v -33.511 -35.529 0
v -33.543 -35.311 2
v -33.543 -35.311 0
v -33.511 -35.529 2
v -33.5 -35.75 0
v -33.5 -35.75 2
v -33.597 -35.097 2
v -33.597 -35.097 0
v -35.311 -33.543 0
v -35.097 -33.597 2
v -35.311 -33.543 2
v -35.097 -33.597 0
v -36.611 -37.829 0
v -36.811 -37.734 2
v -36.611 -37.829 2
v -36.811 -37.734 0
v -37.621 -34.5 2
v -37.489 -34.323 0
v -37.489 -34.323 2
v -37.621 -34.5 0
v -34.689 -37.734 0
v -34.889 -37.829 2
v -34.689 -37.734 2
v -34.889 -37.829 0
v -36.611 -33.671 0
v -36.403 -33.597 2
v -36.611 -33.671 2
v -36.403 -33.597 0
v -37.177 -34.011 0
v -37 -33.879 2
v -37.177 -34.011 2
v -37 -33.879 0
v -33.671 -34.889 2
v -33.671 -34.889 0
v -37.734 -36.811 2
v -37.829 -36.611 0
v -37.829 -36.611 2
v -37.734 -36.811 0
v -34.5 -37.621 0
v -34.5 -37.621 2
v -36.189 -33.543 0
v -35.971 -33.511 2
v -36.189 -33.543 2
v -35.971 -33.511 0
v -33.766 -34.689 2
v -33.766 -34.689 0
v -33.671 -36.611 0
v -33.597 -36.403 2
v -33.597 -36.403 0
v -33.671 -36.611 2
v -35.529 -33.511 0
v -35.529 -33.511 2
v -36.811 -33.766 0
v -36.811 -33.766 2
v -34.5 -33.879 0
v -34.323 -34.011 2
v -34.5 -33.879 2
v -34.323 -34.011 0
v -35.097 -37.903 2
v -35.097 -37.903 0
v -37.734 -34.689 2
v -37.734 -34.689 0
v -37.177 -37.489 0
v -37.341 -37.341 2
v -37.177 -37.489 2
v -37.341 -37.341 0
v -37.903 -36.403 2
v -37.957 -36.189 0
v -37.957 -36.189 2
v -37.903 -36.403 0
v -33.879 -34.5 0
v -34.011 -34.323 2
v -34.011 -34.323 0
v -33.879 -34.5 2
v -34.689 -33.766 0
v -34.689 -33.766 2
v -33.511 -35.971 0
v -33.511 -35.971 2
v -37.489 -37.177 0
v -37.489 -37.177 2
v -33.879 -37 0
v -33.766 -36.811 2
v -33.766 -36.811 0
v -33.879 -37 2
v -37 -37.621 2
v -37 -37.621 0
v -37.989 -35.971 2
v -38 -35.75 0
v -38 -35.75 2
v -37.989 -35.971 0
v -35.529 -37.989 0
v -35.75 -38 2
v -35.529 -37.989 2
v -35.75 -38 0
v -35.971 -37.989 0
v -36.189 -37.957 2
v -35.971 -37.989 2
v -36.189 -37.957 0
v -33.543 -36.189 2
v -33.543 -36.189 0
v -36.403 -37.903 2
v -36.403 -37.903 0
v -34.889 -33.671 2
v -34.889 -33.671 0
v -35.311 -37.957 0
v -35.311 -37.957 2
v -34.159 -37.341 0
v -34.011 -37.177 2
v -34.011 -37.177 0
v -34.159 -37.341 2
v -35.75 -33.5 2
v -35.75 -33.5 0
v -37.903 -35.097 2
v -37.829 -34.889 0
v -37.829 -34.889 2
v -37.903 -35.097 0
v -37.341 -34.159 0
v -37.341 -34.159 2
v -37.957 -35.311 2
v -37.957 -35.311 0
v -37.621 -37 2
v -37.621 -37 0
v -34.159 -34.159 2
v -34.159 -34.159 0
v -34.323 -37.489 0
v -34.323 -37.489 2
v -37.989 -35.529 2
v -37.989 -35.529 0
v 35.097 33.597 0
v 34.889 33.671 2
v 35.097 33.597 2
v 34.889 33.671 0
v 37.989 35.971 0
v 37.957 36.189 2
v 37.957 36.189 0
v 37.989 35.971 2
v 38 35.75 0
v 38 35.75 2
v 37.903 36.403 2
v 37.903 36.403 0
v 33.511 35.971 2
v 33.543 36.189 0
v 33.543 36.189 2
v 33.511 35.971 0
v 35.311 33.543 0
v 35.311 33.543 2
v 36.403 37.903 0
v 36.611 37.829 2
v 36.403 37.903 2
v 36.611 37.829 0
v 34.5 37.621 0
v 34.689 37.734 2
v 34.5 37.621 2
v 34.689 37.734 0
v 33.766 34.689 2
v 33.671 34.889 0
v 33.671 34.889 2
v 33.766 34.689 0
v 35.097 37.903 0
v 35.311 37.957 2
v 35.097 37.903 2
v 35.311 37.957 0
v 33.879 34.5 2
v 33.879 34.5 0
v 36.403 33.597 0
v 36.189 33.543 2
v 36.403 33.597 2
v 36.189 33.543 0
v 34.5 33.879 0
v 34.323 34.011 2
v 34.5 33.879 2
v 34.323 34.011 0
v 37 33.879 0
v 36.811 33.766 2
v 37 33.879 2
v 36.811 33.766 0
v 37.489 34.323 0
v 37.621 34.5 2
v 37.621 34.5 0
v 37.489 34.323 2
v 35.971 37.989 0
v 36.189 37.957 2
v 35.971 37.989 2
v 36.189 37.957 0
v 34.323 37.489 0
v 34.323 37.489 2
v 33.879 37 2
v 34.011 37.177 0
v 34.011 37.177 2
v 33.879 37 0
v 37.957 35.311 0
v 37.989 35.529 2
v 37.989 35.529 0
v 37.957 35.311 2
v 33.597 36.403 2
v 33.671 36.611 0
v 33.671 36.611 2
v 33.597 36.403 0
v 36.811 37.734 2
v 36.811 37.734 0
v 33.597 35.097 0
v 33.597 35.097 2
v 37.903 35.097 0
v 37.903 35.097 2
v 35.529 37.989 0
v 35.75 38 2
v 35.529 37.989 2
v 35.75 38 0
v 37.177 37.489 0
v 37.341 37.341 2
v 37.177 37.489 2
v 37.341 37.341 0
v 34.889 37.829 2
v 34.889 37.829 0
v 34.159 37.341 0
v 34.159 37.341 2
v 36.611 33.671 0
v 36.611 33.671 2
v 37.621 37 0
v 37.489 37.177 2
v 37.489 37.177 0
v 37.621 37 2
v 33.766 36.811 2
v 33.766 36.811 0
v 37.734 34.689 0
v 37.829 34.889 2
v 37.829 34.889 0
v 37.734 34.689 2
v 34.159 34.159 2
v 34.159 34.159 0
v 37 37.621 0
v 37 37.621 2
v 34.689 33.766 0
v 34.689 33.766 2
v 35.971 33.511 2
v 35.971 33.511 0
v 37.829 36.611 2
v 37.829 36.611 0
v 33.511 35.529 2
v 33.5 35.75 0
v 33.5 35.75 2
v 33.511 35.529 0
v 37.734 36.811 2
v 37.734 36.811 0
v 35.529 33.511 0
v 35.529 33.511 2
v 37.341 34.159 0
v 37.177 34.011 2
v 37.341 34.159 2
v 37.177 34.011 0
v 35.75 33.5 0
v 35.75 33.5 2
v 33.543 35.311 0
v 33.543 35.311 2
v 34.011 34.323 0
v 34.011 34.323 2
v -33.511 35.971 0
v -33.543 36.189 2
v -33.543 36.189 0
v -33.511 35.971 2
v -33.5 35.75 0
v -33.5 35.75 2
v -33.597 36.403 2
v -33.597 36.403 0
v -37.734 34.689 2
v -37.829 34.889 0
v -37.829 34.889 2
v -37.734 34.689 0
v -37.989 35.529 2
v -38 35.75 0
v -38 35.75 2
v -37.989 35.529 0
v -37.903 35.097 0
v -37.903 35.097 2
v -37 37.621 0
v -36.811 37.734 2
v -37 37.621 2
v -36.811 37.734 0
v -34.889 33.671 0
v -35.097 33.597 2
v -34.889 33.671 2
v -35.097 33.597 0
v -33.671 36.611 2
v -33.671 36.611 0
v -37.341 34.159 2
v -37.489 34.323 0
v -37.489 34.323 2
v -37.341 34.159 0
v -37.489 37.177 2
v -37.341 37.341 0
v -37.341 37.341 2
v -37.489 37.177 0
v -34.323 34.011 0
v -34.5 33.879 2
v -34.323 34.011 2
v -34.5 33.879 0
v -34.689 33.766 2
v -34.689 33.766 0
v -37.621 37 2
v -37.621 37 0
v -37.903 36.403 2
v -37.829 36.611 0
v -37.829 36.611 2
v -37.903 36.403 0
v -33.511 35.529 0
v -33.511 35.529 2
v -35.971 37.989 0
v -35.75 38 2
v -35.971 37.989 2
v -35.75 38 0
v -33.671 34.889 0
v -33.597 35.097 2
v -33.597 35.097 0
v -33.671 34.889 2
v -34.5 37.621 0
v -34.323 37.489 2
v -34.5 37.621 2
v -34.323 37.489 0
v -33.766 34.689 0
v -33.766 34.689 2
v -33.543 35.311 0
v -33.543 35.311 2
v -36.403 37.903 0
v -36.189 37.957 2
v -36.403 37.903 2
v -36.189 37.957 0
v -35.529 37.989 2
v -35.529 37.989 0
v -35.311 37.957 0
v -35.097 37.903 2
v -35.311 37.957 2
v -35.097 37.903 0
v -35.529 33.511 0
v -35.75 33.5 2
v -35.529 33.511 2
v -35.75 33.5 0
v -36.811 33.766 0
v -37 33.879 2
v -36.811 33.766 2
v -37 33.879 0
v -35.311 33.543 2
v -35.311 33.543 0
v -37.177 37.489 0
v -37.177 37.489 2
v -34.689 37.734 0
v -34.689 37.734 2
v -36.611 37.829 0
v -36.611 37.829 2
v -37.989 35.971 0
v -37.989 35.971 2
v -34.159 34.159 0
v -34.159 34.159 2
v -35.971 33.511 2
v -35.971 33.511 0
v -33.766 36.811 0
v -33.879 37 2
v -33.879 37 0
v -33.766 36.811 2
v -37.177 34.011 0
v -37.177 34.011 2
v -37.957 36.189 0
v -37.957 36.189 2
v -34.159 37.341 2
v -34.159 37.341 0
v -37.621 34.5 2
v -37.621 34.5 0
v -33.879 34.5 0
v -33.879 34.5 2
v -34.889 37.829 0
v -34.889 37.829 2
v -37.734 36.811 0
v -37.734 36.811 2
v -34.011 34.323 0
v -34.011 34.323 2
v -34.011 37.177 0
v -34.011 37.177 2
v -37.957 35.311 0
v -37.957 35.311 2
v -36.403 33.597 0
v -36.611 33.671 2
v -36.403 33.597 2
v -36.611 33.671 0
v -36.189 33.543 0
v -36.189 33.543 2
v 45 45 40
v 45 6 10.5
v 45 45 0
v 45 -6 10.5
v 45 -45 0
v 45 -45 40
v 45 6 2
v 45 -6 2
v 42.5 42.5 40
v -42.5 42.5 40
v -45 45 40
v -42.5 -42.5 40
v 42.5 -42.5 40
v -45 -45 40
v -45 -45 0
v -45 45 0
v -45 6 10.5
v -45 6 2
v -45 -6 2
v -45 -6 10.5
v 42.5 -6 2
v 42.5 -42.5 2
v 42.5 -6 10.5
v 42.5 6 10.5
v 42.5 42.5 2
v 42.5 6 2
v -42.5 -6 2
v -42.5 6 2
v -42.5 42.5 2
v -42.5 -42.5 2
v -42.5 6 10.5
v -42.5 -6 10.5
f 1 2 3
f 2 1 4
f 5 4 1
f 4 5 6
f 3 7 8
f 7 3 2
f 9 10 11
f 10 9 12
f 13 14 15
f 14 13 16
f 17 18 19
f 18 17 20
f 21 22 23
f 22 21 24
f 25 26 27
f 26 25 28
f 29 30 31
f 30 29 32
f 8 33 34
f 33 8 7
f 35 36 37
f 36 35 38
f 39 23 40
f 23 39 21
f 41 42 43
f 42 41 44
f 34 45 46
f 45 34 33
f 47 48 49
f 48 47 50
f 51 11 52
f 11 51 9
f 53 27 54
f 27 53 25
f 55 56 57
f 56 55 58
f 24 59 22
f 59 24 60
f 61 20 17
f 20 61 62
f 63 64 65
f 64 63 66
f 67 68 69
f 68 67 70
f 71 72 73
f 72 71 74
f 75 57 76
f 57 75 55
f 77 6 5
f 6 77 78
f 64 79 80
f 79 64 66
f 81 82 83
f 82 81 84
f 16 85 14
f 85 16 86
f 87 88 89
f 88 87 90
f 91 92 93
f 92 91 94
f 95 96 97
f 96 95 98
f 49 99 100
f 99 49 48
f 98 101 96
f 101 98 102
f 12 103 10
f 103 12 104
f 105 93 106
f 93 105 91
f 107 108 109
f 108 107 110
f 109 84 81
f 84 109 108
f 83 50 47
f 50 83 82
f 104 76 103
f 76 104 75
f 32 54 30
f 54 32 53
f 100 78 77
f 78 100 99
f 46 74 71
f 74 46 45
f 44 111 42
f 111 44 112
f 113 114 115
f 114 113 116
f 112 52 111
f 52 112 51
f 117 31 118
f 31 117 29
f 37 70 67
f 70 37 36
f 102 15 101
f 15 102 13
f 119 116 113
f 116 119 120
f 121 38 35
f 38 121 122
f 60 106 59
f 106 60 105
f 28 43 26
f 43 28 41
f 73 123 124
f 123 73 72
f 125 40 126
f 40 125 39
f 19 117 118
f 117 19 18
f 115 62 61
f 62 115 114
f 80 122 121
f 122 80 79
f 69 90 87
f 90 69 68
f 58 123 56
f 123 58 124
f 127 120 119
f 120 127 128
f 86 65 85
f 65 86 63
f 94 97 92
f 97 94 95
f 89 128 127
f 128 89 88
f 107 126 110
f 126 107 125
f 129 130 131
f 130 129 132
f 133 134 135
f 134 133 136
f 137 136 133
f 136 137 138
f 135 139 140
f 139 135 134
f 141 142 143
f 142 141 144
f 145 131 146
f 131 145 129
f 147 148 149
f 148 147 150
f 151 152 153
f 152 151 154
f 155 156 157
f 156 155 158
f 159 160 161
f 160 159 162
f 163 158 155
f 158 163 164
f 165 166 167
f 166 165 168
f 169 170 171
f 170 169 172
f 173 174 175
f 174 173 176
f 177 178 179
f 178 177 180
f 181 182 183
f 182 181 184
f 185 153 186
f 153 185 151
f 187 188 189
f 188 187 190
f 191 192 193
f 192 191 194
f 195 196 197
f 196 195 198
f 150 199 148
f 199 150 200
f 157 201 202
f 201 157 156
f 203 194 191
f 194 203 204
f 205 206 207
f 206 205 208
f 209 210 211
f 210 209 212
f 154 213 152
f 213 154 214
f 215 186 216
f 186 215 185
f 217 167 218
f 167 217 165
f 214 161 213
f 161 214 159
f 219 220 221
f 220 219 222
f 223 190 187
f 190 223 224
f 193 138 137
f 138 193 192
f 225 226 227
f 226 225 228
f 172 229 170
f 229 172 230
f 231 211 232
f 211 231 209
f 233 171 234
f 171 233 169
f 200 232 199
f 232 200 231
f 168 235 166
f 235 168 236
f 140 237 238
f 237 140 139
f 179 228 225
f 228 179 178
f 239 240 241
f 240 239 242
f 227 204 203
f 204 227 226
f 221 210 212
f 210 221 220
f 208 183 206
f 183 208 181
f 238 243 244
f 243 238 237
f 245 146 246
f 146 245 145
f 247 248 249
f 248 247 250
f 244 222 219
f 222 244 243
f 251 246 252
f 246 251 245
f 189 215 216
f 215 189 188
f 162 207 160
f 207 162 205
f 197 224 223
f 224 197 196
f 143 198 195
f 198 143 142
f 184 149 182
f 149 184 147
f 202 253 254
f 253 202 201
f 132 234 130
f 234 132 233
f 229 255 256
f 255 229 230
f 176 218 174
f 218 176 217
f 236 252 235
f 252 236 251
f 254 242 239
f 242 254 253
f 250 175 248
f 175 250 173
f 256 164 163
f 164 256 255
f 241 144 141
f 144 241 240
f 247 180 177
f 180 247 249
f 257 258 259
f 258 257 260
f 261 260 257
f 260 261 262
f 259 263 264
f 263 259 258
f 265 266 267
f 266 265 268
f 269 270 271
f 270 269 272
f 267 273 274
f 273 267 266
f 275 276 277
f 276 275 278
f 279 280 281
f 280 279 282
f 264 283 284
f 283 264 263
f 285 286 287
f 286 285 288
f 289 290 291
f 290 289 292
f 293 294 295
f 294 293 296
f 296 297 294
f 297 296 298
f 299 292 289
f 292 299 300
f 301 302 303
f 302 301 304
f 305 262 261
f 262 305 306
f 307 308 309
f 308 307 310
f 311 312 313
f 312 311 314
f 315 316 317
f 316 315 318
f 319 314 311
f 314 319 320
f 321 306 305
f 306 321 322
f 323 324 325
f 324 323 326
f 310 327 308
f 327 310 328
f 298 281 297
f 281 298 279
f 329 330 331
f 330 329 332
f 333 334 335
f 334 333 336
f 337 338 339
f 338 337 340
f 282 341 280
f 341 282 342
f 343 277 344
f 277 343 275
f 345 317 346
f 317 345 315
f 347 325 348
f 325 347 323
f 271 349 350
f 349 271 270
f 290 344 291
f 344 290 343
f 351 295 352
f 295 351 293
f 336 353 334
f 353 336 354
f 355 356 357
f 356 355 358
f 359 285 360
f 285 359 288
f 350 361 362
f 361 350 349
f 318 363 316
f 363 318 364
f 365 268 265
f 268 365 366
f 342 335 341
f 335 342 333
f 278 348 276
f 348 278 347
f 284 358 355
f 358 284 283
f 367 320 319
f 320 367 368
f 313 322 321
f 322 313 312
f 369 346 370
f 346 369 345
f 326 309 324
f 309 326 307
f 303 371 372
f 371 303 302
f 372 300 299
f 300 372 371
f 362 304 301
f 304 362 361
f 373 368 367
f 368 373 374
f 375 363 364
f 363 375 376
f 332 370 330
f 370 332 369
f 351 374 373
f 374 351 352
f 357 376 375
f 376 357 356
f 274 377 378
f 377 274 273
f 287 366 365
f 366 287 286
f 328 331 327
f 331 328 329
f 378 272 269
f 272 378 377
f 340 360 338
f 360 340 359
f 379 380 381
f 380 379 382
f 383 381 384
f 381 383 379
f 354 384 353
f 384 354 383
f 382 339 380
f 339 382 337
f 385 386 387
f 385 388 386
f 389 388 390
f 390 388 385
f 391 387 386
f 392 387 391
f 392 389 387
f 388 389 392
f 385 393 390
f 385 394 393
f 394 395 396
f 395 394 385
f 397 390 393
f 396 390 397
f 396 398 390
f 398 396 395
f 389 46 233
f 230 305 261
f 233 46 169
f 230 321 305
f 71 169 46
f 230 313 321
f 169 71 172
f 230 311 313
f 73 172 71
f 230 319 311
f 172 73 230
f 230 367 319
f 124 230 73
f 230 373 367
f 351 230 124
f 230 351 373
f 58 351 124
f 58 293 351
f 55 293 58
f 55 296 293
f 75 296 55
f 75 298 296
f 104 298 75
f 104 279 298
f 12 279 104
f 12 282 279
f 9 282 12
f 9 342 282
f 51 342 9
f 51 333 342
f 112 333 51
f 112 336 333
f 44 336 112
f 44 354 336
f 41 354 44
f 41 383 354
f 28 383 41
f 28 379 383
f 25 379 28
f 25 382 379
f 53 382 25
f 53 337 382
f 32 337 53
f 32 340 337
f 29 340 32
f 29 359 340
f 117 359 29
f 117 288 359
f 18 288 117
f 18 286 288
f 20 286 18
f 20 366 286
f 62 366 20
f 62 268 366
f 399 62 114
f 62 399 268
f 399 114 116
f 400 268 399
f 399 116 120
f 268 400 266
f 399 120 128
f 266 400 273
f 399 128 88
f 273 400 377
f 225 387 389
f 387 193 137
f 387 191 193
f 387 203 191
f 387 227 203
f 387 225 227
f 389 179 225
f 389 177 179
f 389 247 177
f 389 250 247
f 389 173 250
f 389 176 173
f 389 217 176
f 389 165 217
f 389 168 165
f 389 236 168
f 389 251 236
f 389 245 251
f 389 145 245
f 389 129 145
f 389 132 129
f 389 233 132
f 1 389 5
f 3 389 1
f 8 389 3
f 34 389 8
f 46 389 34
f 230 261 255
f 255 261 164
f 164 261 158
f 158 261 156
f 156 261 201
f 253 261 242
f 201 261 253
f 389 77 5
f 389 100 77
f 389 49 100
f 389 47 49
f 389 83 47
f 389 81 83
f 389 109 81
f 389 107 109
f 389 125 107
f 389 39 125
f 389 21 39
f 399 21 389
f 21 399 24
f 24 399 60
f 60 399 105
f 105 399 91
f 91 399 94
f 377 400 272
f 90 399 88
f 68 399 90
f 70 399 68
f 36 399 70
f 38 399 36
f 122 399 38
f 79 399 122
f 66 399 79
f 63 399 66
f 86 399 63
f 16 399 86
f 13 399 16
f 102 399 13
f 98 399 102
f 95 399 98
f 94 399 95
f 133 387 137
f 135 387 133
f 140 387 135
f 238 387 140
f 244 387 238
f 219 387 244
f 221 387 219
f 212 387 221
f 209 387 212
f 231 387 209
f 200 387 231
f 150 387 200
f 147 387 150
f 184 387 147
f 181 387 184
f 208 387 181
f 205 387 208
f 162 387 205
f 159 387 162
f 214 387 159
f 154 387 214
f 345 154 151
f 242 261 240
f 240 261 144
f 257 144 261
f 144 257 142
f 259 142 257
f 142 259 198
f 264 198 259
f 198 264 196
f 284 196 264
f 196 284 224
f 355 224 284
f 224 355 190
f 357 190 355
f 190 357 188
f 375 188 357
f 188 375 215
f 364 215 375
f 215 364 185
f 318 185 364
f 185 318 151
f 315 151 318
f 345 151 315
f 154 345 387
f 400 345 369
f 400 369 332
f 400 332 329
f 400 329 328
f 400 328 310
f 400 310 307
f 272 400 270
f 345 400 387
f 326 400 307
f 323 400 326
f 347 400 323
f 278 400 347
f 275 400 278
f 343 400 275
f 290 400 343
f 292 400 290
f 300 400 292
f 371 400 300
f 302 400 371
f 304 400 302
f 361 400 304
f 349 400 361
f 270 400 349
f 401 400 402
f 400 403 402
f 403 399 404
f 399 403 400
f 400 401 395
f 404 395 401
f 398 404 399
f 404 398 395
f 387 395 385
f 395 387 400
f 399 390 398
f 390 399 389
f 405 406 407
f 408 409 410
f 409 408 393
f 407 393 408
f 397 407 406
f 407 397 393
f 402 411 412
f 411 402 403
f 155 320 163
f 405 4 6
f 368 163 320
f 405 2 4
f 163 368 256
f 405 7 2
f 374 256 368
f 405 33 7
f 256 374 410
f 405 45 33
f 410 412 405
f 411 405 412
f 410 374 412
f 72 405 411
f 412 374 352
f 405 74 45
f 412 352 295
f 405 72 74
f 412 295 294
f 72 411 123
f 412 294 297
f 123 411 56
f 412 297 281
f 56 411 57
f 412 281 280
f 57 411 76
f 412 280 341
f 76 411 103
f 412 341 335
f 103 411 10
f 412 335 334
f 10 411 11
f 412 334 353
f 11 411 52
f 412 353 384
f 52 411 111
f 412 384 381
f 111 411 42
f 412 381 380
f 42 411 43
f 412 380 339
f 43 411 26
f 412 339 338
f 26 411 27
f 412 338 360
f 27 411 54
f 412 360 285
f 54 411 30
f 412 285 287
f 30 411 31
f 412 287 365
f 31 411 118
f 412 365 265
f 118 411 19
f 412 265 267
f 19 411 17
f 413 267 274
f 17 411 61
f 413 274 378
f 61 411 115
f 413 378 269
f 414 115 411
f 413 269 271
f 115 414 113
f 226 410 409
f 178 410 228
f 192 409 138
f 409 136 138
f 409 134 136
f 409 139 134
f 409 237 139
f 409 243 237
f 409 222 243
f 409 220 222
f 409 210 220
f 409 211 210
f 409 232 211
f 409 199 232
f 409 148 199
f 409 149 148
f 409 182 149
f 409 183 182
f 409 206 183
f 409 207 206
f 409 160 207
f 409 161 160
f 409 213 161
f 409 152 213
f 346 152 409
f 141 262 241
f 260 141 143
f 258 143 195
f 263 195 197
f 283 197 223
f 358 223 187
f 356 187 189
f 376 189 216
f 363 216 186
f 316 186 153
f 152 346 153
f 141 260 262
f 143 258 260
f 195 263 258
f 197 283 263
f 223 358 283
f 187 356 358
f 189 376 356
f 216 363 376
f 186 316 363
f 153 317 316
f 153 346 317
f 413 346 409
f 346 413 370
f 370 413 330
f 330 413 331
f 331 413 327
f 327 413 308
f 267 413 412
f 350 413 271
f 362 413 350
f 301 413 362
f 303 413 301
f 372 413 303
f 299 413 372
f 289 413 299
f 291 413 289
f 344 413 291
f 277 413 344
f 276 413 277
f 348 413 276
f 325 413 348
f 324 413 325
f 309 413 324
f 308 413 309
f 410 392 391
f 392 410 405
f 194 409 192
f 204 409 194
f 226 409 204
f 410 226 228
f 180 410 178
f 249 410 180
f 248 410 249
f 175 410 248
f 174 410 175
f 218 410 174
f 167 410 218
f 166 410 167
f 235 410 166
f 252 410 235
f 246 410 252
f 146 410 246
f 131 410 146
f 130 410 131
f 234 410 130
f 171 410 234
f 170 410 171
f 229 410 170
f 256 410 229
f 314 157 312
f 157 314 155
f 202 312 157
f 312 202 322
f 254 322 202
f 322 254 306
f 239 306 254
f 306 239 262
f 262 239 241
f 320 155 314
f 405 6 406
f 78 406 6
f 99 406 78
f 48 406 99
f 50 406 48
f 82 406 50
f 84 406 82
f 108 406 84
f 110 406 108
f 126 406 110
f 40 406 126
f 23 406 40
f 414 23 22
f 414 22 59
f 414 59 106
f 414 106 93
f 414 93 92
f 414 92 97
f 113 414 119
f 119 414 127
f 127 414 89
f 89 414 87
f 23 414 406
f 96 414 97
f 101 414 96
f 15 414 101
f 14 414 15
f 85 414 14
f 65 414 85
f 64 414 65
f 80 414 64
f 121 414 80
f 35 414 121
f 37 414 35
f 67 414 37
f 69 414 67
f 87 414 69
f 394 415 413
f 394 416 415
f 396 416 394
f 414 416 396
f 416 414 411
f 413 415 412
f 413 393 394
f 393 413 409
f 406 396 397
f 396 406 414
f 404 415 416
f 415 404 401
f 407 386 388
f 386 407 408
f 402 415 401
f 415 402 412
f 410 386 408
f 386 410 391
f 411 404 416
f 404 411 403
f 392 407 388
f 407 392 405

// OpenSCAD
// Magnetic stirrer housing for an 80 mm PC case fan
// Print orientation: top plate on bed (z = 0), walls rise to z = 40, open top

// ---------- Dimensions (mm) ----------
top_thickness      = 2;     // top plate thickness
wall_thickness     = 2.5;   // wall thickness
box_height         = 40;    // total height of walls from top plate
outer_size         = 90;    // outer X and Y size of box
screw_hole_count   = 4;     // number of M4 screw holes
screw_hole_d       = 4.5;   // screw hole diameter
screw_hole_pitch   = 71.5;  // square pattern pitch between holes
notch_width        = 12;    // cable notch width
notch_depth        = 8;     // notch depth from open edge (z = 32 to 40)
eps                = 0.5;   // cutter overshoot past faces

$fn = 64;

// ---------- Derived ----------
inner_size = outer_size - 2 * wall_thickness;   // 85 x 85
floor_z    = top_thickness;                     // z = 2, floor of open box

// ---------- Model ----------
difference() {
    // Solid box: top plate + walls, open at top
    translate([-outer_size / 2, -outer_size / 2, 0])
        cube([outer_size, outer_size, box_height]);

    // Open top (through the walls)
    translate([-inner_size / 2, -inner_size / 2, floor_z])
        cube([inner_size, inner_size, eps + box_height - floor_z]);

    // Screw holes in top plate, centred on plate
    for (i = [0 : screw_hole_count - 1]) {
        a = screw_hole_pitch / 2;
        x = (i % 2 == 0) ? -a : a;
        y = (i / 2 == 0) ? -a : a;
        translate([x, y, -eps])
            cylinder(d = screw_hole_d, h = top_thickness + 2 * eps);
    }

    // Cable notch in one wall, centred along the wall
    translate([-outer_size / 2, -notch_width / 2, floor_z])
        cube([outer_size, notch_width, notch_depth + eps]);
}
